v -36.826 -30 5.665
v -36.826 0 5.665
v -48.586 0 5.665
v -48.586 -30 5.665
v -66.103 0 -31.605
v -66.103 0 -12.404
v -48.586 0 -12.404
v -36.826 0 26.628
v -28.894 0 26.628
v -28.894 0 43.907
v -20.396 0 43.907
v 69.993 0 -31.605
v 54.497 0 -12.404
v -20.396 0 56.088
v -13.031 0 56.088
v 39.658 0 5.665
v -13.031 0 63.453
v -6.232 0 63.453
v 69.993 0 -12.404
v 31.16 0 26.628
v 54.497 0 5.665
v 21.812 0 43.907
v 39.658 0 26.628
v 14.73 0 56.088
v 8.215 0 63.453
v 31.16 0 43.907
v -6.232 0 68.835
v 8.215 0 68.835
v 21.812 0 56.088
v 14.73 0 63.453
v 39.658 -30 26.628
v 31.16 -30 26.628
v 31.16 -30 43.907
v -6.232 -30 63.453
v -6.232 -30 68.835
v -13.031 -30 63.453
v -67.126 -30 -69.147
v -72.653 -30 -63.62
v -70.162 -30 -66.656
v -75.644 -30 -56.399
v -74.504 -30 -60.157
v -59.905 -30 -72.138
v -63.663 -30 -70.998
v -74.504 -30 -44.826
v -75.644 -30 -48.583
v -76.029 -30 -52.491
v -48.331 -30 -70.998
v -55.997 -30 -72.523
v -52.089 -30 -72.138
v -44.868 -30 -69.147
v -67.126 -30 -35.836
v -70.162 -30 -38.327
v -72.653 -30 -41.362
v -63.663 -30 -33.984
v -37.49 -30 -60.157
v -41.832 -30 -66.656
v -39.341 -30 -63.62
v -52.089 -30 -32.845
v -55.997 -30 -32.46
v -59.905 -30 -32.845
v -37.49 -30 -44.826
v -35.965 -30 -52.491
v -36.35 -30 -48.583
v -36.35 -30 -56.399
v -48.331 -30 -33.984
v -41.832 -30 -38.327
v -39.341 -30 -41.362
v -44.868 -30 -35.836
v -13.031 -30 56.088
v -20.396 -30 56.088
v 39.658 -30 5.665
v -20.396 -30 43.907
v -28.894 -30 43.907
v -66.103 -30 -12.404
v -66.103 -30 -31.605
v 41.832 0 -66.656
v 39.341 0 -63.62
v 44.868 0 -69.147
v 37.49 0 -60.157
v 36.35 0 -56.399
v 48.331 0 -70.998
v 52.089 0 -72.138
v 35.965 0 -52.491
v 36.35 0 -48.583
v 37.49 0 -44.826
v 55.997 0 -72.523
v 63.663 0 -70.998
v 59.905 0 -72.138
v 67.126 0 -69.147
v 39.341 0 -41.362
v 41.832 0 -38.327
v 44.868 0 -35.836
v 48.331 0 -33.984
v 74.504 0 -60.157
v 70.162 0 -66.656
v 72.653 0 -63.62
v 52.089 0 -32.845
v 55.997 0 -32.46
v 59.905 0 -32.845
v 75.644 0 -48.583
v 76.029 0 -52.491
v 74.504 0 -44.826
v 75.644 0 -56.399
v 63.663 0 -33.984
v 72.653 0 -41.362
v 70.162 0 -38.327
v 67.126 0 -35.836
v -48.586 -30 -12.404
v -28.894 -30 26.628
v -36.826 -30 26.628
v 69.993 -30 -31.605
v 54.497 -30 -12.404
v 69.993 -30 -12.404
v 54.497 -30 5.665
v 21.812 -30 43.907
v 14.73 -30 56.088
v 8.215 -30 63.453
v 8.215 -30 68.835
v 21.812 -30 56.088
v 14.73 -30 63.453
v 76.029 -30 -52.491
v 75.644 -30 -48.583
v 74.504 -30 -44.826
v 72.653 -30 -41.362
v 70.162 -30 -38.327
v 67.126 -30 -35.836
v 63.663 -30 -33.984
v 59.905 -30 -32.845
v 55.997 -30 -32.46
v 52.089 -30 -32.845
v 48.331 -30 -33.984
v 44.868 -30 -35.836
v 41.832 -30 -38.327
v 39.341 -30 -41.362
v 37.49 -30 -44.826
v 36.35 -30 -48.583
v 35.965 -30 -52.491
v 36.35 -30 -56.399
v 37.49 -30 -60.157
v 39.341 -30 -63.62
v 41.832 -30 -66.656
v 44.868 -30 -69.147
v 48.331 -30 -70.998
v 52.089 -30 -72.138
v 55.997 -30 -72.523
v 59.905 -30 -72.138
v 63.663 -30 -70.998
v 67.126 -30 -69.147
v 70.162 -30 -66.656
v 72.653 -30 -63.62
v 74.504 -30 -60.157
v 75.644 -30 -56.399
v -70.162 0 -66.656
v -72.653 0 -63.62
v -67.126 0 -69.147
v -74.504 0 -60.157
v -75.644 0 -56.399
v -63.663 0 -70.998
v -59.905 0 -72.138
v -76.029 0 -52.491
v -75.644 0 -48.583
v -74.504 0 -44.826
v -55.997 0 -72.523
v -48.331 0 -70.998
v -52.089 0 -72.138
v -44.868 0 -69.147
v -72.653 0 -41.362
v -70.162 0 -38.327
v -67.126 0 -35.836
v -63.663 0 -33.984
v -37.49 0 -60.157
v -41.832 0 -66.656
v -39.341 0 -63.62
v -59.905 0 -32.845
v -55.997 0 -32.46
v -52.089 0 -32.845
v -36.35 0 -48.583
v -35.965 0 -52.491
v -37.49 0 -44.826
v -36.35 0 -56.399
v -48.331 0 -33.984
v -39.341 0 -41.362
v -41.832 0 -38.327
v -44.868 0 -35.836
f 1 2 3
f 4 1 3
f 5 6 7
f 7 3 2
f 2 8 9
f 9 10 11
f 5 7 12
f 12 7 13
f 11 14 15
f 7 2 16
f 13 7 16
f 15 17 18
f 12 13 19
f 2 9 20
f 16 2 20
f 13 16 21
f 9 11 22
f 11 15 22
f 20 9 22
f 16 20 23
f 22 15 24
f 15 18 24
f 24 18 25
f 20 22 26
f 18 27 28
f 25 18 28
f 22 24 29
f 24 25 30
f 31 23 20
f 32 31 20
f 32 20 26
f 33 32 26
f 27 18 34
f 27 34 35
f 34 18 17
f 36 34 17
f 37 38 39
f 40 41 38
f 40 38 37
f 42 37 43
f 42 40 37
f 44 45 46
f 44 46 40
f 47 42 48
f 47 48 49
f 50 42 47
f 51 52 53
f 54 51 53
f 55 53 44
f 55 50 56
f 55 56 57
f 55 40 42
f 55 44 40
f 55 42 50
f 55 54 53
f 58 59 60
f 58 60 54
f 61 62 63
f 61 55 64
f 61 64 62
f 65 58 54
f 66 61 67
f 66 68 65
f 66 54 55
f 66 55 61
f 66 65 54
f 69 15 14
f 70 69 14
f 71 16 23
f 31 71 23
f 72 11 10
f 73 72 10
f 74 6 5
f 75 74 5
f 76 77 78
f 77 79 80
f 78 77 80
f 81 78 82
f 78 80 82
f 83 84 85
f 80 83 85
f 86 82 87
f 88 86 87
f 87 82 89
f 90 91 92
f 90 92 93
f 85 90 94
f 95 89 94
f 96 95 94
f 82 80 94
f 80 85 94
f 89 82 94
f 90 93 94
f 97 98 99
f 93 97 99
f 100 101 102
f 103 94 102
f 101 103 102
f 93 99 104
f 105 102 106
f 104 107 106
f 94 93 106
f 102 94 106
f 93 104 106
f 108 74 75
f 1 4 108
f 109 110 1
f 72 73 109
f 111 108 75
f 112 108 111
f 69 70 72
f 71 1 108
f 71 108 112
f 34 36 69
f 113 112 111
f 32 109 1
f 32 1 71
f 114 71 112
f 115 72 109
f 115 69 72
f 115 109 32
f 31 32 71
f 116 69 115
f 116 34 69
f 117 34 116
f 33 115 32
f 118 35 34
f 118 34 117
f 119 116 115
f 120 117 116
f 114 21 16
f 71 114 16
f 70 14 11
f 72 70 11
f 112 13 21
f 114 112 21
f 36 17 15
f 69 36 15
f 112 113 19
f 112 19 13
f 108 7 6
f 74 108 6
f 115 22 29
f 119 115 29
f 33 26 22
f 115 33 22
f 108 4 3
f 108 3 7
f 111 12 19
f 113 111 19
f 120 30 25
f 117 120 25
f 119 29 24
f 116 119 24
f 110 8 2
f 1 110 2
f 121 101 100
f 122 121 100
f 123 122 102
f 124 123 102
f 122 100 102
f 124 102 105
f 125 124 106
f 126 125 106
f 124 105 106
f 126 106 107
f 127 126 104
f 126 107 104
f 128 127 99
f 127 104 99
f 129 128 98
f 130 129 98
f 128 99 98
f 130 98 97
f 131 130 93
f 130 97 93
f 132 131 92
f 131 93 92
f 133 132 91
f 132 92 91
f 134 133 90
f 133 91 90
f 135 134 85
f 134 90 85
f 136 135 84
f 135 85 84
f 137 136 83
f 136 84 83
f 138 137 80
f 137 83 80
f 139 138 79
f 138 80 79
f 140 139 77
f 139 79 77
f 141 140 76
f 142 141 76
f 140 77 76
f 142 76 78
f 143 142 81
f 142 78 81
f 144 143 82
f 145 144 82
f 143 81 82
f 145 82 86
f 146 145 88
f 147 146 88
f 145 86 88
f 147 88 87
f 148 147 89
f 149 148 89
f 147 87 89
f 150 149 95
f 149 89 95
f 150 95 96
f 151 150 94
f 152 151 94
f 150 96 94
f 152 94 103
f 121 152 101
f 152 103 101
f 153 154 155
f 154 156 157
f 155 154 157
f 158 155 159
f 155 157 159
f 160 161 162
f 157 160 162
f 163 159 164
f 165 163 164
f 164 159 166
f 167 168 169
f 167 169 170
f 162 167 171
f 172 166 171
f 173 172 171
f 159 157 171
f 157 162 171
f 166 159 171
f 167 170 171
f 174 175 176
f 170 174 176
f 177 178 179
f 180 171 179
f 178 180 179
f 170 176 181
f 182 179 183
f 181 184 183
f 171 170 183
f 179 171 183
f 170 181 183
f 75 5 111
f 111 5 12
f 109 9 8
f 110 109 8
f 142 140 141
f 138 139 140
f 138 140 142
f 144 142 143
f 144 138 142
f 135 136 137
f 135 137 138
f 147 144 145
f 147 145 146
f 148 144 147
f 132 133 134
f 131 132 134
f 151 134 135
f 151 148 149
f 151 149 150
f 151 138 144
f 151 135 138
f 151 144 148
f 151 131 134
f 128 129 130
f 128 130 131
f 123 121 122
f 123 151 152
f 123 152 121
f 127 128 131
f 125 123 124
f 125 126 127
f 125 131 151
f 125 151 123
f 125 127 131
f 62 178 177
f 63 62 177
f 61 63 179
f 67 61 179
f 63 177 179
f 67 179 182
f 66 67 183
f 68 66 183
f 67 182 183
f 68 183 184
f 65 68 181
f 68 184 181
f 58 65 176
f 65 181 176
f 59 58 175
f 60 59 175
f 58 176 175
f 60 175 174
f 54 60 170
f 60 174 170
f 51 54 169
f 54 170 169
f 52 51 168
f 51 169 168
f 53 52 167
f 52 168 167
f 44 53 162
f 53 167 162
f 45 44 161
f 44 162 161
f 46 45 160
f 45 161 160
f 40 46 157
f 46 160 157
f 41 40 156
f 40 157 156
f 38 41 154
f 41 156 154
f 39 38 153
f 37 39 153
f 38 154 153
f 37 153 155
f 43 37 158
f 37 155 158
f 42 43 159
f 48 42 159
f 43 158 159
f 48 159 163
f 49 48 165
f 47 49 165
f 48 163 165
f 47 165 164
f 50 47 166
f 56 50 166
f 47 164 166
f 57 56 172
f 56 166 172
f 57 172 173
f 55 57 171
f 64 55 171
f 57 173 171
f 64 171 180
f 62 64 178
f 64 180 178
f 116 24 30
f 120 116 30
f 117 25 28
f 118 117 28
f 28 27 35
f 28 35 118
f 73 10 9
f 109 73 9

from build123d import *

# Parameters (mm, degrees)
F0_R     = 20.031774
F0_W     = 14.446942
F0_H     = 5.382202
F1_DEPTH = 30


with BuildPart() as f1:
    # F0 (on Front) → F1 (new body)
    with BuildSketch(Plane.XZ):
        with Locations((-55.996973, -52.491438)):
            Circle(F0_R)
        with Locations((55.996973, -52.491438)):
            Circle(F0_R)
        with Locations((0.991457, 66.144336)):
            Rectangle(F0_W, F0_H)
        Polygon((-28.893886, 26.627699), (-36.825541, 26.627699), (-36.825541, 5.665468), (39.658275, 5.665468), (39.658275, 26.627699), (31.16007, 26.627699), align=None)
        Polygon((-28.893886, 43.907374), (-28.893886, 26.627699), (31.16007, 26.627699), (31.16007, 43.907374), (21.812052, 43.907374), (-20.395683, 43.907374), align=None)
        Polygon((-20.395683, 56.088131), (-20.395683, 43.907374), (21.812052, 43.907374), (21.812052, 56.088131), (14.730218, 56.088131), (-13.030576, 56.088131), align=None)
        Polygon((-13.030576, 63.453235), (-13.030576, 56.088131), (14.730218, 56.088131), (14.730218, 63.453235), (8.214928, 63.453235), (-6.232014, 63.453235), align=None)
        Polygon((39.658275, 5.665468), (-36.825541, 5.665468), (-48.585817, 5.665468), (-48.585817, -12.403823), (54.496627, -12.403823), (54.496627, 5.665468), align=None)
        Polygon((54.496627, -12.403823), (-48.585817, -12.403823), (-66.103093, -12.403823), (-66.103093, -31.605452), (69.992684, -31.605452), (69.992684, -12.403823), align=None)
    extrude(amount=F1_DEPTH)


solid = f1.part
